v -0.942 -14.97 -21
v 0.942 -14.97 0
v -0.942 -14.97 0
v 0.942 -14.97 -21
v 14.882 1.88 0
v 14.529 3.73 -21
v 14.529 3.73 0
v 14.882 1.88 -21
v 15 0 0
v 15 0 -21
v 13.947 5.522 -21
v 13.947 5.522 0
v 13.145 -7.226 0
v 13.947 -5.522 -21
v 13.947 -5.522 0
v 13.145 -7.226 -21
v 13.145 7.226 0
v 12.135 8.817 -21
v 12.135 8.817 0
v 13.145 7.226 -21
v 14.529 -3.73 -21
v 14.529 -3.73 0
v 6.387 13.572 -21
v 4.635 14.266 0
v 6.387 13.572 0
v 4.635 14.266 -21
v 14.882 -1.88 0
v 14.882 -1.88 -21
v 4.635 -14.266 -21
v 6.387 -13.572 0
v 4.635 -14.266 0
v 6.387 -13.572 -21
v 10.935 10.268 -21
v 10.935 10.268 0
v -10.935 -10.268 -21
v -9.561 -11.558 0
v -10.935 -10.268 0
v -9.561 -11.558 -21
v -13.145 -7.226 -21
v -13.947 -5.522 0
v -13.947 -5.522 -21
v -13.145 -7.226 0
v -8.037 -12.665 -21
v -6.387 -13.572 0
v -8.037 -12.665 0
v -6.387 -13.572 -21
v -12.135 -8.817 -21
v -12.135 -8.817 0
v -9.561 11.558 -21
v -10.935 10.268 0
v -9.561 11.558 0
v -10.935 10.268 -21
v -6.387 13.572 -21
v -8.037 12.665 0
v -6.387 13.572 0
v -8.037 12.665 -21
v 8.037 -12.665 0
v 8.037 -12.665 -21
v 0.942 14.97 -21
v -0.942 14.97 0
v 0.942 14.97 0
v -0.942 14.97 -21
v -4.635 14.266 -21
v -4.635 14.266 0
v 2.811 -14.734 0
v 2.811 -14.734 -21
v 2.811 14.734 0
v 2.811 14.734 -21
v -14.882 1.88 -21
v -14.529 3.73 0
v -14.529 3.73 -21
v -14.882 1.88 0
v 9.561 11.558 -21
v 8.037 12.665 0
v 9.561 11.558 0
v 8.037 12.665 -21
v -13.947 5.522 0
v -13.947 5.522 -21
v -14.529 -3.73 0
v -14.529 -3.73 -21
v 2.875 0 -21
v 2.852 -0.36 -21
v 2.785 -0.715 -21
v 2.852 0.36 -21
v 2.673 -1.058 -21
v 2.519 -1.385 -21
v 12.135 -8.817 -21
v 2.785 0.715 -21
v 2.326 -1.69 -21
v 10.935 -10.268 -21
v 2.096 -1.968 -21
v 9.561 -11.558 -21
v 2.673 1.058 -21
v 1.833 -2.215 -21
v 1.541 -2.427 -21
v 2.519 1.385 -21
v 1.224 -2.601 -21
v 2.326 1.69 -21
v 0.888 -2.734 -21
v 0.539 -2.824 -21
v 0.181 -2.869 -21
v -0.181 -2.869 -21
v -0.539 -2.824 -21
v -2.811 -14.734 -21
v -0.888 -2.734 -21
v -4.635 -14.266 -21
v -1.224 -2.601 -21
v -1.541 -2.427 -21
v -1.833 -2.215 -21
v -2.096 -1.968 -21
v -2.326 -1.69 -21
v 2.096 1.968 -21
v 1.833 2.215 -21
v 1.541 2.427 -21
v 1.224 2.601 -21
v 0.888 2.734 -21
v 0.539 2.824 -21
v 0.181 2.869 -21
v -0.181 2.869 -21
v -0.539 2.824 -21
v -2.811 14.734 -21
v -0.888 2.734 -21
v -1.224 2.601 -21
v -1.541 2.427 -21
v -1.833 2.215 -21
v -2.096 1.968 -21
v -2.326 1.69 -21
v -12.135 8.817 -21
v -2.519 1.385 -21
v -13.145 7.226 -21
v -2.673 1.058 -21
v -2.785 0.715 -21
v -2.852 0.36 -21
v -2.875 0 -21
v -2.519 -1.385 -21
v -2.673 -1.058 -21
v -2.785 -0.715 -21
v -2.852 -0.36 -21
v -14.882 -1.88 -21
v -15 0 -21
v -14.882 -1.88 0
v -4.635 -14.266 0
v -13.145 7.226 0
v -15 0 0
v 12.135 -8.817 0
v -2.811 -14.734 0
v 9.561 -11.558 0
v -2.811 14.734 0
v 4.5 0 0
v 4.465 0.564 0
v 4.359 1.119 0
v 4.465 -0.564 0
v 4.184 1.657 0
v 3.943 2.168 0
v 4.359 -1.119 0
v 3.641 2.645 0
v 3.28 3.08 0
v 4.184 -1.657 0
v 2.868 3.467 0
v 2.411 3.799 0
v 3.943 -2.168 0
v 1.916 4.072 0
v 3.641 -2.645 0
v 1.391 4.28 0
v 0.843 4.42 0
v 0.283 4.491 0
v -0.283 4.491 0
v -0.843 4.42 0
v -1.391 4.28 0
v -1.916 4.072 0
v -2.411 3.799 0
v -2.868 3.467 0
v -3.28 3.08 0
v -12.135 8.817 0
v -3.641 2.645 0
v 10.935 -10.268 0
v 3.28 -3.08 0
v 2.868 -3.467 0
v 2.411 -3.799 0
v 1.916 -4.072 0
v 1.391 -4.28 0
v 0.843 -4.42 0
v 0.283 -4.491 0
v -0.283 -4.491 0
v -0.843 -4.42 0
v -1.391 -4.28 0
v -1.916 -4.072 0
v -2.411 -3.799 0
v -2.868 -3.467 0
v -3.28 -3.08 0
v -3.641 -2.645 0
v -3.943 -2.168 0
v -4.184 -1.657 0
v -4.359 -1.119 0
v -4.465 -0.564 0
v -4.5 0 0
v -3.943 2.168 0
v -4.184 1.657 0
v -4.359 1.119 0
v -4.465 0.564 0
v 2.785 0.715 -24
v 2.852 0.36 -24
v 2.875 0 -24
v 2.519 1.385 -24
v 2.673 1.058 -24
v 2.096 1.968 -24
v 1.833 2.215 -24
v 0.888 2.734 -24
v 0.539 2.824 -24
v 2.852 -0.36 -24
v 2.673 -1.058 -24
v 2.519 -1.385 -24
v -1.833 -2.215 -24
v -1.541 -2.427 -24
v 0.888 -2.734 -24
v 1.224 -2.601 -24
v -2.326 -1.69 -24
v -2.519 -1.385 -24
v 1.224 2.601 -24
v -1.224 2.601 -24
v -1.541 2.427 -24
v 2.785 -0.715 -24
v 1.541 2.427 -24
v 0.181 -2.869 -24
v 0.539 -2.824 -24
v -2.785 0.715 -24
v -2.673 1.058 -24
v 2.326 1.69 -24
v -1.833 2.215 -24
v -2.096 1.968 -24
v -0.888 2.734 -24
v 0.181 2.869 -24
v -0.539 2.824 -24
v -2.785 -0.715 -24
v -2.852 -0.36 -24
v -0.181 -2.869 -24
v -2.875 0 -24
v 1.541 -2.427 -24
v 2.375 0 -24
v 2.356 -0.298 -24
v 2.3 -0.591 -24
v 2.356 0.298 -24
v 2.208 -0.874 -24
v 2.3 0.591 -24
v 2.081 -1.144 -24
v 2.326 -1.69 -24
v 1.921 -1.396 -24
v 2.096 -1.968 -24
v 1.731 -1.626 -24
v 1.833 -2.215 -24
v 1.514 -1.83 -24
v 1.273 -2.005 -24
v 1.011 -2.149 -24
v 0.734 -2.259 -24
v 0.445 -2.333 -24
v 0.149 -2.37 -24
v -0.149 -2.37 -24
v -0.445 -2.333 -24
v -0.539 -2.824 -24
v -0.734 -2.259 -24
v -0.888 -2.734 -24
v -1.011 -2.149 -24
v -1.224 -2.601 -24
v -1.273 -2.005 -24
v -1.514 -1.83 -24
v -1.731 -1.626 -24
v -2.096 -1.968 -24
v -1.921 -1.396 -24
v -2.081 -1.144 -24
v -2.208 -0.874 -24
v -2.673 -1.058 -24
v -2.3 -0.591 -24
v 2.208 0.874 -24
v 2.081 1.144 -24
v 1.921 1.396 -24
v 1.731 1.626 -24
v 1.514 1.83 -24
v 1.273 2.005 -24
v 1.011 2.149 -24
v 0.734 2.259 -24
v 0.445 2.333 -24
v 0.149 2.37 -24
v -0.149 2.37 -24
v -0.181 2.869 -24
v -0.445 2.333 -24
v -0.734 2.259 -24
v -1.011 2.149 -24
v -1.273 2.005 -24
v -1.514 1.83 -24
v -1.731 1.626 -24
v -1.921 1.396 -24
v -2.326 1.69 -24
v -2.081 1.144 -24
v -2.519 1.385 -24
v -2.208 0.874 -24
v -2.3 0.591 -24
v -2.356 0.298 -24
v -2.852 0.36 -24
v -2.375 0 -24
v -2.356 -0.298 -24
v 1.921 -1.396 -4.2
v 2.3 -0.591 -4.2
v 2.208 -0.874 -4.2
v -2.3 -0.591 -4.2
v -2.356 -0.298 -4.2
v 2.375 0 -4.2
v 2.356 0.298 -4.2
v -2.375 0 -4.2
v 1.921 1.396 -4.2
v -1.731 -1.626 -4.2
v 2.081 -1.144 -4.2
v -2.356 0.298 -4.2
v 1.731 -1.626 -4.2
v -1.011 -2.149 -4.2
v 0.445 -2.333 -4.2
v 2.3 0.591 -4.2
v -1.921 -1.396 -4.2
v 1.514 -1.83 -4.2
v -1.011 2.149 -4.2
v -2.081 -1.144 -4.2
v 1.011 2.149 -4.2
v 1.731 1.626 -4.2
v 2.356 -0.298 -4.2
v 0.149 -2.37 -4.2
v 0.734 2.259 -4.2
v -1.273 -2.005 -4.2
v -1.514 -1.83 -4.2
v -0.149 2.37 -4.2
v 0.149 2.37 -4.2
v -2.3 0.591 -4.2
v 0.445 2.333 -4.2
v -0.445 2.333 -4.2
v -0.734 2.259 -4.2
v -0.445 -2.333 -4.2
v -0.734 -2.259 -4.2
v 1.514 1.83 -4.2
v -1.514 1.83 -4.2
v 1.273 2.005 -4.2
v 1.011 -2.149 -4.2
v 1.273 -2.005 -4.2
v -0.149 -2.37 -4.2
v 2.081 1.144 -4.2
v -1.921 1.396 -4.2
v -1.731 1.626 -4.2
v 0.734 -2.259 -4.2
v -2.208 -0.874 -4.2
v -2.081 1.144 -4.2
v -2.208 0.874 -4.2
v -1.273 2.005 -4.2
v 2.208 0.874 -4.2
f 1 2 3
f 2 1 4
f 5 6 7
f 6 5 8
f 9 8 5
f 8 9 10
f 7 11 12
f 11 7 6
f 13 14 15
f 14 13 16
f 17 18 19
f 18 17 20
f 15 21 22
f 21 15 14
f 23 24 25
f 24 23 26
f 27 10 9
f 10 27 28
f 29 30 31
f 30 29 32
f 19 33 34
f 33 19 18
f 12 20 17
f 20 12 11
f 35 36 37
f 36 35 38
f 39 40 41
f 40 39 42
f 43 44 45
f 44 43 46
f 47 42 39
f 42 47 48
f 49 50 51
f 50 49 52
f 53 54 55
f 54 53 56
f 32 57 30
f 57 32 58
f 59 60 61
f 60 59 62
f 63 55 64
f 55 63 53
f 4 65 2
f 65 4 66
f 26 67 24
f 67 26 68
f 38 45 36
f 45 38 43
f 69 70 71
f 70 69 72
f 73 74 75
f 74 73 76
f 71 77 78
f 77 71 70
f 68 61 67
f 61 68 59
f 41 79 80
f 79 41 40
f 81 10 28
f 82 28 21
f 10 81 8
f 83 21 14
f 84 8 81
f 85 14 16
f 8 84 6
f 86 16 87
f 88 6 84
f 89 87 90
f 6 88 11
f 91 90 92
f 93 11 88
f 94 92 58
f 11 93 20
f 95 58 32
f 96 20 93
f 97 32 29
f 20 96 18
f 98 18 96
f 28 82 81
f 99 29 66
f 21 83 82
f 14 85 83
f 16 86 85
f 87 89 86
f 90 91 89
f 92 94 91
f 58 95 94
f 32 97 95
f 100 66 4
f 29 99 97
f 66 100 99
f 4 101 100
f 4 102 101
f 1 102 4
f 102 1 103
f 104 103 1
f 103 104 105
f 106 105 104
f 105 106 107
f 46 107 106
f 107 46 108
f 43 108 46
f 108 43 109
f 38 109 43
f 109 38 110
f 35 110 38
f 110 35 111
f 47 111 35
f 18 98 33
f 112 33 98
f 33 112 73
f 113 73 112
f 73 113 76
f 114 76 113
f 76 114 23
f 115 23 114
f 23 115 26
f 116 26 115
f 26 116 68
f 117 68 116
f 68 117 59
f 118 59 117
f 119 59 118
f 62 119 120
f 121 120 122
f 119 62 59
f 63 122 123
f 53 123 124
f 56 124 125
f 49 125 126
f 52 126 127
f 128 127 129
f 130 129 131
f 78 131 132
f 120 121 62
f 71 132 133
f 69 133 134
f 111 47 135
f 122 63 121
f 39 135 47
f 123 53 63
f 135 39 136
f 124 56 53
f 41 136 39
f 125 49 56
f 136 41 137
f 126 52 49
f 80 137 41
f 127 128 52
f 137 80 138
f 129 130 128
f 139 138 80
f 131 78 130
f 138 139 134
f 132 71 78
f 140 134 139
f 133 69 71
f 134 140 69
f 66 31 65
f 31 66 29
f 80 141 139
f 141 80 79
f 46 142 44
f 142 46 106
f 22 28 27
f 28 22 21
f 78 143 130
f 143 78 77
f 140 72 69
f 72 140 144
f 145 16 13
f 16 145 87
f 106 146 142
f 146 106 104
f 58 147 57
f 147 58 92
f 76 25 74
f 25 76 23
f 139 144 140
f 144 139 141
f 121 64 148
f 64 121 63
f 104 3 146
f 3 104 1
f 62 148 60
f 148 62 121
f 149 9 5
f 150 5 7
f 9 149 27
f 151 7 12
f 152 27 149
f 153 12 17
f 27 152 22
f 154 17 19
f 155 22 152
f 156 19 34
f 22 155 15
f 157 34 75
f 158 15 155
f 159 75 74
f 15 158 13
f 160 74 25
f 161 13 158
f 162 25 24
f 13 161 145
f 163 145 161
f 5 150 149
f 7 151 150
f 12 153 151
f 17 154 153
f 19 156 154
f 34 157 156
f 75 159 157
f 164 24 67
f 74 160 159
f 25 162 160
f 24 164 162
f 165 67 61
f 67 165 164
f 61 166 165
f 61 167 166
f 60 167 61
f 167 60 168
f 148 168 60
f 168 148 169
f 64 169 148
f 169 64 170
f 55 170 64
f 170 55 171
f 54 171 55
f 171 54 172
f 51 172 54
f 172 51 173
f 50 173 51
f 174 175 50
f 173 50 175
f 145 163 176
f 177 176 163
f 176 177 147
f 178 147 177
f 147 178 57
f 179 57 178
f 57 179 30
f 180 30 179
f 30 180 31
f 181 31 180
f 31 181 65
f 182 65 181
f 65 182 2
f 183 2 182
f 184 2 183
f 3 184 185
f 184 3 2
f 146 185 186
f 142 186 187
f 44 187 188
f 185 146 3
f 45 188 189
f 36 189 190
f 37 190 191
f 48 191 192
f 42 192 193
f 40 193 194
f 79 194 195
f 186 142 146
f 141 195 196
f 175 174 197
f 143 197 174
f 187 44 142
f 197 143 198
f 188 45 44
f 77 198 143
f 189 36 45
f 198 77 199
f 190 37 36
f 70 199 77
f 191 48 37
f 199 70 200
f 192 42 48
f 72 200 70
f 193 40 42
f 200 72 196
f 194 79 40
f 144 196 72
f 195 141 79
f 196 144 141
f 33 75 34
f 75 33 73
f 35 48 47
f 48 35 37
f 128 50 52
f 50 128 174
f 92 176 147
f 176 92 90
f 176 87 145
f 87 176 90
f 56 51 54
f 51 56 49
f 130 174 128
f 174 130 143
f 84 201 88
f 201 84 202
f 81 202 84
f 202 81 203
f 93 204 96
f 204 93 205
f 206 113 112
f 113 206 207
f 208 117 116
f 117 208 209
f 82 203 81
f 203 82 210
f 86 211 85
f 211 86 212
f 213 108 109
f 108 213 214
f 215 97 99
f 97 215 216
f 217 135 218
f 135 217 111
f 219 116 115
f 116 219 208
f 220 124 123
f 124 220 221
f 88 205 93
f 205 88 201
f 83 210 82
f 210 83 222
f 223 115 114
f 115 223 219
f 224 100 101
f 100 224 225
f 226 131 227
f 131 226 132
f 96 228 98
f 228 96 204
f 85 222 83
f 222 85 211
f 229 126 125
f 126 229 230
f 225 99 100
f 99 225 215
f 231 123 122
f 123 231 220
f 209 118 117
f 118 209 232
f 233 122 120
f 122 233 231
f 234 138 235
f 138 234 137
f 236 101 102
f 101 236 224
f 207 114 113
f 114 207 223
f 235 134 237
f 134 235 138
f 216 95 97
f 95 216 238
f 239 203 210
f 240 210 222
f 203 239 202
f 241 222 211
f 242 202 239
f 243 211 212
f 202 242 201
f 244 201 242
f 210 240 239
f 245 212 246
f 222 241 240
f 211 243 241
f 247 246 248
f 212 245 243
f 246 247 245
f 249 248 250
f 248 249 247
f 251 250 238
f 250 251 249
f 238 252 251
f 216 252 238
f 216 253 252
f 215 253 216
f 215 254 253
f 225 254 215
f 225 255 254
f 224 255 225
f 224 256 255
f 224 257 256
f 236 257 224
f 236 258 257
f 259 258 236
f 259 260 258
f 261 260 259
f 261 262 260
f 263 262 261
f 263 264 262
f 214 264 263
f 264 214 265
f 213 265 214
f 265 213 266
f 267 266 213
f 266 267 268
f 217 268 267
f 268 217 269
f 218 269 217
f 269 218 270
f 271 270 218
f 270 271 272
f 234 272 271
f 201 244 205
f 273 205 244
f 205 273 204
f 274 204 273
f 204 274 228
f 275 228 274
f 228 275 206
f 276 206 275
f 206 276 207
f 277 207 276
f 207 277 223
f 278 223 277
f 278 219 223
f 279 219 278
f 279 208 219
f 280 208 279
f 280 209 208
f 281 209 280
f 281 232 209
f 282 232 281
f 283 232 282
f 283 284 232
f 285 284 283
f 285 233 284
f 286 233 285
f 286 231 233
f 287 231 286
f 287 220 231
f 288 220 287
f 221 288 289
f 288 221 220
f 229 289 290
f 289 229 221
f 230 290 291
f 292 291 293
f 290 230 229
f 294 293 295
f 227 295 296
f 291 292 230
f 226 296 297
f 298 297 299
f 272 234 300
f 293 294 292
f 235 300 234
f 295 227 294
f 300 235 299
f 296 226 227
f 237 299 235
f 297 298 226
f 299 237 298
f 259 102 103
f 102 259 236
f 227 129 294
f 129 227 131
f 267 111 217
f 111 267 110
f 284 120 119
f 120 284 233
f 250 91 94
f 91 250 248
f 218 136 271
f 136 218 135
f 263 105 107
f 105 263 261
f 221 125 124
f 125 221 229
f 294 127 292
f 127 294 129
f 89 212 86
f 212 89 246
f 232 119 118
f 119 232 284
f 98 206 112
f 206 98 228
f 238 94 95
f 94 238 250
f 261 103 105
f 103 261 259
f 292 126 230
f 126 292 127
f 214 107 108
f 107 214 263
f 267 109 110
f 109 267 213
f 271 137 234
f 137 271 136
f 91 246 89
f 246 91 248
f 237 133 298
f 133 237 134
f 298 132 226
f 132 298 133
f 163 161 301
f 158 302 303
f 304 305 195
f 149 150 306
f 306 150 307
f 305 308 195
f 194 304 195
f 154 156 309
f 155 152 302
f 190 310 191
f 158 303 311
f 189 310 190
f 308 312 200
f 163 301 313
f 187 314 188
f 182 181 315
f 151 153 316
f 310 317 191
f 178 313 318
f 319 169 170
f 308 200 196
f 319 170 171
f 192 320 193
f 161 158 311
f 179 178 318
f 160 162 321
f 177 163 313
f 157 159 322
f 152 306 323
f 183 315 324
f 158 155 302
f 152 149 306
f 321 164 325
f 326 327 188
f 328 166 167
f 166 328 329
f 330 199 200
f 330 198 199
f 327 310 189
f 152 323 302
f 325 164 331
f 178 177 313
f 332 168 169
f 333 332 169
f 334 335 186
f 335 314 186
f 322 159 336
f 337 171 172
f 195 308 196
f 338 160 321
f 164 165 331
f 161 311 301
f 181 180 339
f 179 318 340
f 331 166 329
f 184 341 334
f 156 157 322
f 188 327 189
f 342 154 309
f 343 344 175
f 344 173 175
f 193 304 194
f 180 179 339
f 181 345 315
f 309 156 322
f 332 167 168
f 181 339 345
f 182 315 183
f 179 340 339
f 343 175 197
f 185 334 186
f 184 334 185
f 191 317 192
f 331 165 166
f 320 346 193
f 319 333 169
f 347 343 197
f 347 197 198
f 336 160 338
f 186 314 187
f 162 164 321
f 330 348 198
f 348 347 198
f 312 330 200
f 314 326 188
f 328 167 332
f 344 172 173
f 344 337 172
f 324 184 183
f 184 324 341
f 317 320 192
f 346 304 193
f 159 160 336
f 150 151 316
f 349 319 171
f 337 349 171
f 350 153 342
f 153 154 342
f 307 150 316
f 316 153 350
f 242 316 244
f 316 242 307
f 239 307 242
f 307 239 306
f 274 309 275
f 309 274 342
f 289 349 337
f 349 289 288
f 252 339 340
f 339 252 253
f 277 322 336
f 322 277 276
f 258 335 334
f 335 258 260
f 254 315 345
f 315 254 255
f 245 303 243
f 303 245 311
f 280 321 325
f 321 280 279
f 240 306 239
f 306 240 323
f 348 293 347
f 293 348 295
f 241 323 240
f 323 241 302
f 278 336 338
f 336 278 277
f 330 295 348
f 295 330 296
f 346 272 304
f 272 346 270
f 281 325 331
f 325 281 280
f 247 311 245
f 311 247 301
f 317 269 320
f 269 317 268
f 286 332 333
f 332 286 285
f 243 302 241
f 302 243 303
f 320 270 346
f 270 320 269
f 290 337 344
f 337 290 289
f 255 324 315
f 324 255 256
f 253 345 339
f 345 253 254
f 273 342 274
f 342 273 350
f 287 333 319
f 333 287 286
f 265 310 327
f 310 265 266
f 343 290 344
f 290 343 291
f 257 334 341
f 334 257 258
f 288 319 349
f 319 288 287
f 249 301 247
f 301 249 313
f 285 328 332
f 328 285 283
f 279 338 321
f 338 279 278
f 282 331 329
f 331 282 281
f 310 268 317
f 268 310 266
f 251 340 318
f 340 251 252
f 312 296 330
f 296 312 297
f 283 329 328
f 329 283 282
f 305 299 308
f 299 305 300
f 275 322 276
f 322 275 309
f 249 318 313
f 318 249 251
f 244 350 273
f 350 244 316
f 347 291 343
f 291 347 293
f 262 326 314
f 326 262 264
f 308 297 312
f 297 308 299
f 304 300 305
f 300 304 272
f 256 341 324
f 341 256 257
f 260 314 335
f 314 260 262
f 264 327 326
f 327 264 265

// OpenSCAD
$fn = 50;

difference() {
	union() {
		translate(v = [0, 0, -21.0]) {
			cylinder(h = 21, r = 15.0);
		}
		#translate(v = [0, 0, -24.0]) {
			cylinder(h = 24, r = 2.875);
		}
	}
	union() {
		translate(v = [0, 0, 0]) {
			rotate(a = [0, 0, 0]) {
				difference() {
					union() {
						translate(v = [0, 0, -24.0]) {
							cylinder(h = 24, r = 2.25);
						}
						translate(v = [0, 0, -4.2]) {
							cylinder(h = 4.2, r1 = 2.375, r2 = 4.5);
						}
						translate(v = [0, 0, -24.0]) {
							cylinder(h = 24, r = 2.375);
						}
						translate(v = [0, 0, -24.0]) {
							cylinder(h = 24, r = 2.25);
						}
					}
					union();
				}
			}
		}
	}
}
